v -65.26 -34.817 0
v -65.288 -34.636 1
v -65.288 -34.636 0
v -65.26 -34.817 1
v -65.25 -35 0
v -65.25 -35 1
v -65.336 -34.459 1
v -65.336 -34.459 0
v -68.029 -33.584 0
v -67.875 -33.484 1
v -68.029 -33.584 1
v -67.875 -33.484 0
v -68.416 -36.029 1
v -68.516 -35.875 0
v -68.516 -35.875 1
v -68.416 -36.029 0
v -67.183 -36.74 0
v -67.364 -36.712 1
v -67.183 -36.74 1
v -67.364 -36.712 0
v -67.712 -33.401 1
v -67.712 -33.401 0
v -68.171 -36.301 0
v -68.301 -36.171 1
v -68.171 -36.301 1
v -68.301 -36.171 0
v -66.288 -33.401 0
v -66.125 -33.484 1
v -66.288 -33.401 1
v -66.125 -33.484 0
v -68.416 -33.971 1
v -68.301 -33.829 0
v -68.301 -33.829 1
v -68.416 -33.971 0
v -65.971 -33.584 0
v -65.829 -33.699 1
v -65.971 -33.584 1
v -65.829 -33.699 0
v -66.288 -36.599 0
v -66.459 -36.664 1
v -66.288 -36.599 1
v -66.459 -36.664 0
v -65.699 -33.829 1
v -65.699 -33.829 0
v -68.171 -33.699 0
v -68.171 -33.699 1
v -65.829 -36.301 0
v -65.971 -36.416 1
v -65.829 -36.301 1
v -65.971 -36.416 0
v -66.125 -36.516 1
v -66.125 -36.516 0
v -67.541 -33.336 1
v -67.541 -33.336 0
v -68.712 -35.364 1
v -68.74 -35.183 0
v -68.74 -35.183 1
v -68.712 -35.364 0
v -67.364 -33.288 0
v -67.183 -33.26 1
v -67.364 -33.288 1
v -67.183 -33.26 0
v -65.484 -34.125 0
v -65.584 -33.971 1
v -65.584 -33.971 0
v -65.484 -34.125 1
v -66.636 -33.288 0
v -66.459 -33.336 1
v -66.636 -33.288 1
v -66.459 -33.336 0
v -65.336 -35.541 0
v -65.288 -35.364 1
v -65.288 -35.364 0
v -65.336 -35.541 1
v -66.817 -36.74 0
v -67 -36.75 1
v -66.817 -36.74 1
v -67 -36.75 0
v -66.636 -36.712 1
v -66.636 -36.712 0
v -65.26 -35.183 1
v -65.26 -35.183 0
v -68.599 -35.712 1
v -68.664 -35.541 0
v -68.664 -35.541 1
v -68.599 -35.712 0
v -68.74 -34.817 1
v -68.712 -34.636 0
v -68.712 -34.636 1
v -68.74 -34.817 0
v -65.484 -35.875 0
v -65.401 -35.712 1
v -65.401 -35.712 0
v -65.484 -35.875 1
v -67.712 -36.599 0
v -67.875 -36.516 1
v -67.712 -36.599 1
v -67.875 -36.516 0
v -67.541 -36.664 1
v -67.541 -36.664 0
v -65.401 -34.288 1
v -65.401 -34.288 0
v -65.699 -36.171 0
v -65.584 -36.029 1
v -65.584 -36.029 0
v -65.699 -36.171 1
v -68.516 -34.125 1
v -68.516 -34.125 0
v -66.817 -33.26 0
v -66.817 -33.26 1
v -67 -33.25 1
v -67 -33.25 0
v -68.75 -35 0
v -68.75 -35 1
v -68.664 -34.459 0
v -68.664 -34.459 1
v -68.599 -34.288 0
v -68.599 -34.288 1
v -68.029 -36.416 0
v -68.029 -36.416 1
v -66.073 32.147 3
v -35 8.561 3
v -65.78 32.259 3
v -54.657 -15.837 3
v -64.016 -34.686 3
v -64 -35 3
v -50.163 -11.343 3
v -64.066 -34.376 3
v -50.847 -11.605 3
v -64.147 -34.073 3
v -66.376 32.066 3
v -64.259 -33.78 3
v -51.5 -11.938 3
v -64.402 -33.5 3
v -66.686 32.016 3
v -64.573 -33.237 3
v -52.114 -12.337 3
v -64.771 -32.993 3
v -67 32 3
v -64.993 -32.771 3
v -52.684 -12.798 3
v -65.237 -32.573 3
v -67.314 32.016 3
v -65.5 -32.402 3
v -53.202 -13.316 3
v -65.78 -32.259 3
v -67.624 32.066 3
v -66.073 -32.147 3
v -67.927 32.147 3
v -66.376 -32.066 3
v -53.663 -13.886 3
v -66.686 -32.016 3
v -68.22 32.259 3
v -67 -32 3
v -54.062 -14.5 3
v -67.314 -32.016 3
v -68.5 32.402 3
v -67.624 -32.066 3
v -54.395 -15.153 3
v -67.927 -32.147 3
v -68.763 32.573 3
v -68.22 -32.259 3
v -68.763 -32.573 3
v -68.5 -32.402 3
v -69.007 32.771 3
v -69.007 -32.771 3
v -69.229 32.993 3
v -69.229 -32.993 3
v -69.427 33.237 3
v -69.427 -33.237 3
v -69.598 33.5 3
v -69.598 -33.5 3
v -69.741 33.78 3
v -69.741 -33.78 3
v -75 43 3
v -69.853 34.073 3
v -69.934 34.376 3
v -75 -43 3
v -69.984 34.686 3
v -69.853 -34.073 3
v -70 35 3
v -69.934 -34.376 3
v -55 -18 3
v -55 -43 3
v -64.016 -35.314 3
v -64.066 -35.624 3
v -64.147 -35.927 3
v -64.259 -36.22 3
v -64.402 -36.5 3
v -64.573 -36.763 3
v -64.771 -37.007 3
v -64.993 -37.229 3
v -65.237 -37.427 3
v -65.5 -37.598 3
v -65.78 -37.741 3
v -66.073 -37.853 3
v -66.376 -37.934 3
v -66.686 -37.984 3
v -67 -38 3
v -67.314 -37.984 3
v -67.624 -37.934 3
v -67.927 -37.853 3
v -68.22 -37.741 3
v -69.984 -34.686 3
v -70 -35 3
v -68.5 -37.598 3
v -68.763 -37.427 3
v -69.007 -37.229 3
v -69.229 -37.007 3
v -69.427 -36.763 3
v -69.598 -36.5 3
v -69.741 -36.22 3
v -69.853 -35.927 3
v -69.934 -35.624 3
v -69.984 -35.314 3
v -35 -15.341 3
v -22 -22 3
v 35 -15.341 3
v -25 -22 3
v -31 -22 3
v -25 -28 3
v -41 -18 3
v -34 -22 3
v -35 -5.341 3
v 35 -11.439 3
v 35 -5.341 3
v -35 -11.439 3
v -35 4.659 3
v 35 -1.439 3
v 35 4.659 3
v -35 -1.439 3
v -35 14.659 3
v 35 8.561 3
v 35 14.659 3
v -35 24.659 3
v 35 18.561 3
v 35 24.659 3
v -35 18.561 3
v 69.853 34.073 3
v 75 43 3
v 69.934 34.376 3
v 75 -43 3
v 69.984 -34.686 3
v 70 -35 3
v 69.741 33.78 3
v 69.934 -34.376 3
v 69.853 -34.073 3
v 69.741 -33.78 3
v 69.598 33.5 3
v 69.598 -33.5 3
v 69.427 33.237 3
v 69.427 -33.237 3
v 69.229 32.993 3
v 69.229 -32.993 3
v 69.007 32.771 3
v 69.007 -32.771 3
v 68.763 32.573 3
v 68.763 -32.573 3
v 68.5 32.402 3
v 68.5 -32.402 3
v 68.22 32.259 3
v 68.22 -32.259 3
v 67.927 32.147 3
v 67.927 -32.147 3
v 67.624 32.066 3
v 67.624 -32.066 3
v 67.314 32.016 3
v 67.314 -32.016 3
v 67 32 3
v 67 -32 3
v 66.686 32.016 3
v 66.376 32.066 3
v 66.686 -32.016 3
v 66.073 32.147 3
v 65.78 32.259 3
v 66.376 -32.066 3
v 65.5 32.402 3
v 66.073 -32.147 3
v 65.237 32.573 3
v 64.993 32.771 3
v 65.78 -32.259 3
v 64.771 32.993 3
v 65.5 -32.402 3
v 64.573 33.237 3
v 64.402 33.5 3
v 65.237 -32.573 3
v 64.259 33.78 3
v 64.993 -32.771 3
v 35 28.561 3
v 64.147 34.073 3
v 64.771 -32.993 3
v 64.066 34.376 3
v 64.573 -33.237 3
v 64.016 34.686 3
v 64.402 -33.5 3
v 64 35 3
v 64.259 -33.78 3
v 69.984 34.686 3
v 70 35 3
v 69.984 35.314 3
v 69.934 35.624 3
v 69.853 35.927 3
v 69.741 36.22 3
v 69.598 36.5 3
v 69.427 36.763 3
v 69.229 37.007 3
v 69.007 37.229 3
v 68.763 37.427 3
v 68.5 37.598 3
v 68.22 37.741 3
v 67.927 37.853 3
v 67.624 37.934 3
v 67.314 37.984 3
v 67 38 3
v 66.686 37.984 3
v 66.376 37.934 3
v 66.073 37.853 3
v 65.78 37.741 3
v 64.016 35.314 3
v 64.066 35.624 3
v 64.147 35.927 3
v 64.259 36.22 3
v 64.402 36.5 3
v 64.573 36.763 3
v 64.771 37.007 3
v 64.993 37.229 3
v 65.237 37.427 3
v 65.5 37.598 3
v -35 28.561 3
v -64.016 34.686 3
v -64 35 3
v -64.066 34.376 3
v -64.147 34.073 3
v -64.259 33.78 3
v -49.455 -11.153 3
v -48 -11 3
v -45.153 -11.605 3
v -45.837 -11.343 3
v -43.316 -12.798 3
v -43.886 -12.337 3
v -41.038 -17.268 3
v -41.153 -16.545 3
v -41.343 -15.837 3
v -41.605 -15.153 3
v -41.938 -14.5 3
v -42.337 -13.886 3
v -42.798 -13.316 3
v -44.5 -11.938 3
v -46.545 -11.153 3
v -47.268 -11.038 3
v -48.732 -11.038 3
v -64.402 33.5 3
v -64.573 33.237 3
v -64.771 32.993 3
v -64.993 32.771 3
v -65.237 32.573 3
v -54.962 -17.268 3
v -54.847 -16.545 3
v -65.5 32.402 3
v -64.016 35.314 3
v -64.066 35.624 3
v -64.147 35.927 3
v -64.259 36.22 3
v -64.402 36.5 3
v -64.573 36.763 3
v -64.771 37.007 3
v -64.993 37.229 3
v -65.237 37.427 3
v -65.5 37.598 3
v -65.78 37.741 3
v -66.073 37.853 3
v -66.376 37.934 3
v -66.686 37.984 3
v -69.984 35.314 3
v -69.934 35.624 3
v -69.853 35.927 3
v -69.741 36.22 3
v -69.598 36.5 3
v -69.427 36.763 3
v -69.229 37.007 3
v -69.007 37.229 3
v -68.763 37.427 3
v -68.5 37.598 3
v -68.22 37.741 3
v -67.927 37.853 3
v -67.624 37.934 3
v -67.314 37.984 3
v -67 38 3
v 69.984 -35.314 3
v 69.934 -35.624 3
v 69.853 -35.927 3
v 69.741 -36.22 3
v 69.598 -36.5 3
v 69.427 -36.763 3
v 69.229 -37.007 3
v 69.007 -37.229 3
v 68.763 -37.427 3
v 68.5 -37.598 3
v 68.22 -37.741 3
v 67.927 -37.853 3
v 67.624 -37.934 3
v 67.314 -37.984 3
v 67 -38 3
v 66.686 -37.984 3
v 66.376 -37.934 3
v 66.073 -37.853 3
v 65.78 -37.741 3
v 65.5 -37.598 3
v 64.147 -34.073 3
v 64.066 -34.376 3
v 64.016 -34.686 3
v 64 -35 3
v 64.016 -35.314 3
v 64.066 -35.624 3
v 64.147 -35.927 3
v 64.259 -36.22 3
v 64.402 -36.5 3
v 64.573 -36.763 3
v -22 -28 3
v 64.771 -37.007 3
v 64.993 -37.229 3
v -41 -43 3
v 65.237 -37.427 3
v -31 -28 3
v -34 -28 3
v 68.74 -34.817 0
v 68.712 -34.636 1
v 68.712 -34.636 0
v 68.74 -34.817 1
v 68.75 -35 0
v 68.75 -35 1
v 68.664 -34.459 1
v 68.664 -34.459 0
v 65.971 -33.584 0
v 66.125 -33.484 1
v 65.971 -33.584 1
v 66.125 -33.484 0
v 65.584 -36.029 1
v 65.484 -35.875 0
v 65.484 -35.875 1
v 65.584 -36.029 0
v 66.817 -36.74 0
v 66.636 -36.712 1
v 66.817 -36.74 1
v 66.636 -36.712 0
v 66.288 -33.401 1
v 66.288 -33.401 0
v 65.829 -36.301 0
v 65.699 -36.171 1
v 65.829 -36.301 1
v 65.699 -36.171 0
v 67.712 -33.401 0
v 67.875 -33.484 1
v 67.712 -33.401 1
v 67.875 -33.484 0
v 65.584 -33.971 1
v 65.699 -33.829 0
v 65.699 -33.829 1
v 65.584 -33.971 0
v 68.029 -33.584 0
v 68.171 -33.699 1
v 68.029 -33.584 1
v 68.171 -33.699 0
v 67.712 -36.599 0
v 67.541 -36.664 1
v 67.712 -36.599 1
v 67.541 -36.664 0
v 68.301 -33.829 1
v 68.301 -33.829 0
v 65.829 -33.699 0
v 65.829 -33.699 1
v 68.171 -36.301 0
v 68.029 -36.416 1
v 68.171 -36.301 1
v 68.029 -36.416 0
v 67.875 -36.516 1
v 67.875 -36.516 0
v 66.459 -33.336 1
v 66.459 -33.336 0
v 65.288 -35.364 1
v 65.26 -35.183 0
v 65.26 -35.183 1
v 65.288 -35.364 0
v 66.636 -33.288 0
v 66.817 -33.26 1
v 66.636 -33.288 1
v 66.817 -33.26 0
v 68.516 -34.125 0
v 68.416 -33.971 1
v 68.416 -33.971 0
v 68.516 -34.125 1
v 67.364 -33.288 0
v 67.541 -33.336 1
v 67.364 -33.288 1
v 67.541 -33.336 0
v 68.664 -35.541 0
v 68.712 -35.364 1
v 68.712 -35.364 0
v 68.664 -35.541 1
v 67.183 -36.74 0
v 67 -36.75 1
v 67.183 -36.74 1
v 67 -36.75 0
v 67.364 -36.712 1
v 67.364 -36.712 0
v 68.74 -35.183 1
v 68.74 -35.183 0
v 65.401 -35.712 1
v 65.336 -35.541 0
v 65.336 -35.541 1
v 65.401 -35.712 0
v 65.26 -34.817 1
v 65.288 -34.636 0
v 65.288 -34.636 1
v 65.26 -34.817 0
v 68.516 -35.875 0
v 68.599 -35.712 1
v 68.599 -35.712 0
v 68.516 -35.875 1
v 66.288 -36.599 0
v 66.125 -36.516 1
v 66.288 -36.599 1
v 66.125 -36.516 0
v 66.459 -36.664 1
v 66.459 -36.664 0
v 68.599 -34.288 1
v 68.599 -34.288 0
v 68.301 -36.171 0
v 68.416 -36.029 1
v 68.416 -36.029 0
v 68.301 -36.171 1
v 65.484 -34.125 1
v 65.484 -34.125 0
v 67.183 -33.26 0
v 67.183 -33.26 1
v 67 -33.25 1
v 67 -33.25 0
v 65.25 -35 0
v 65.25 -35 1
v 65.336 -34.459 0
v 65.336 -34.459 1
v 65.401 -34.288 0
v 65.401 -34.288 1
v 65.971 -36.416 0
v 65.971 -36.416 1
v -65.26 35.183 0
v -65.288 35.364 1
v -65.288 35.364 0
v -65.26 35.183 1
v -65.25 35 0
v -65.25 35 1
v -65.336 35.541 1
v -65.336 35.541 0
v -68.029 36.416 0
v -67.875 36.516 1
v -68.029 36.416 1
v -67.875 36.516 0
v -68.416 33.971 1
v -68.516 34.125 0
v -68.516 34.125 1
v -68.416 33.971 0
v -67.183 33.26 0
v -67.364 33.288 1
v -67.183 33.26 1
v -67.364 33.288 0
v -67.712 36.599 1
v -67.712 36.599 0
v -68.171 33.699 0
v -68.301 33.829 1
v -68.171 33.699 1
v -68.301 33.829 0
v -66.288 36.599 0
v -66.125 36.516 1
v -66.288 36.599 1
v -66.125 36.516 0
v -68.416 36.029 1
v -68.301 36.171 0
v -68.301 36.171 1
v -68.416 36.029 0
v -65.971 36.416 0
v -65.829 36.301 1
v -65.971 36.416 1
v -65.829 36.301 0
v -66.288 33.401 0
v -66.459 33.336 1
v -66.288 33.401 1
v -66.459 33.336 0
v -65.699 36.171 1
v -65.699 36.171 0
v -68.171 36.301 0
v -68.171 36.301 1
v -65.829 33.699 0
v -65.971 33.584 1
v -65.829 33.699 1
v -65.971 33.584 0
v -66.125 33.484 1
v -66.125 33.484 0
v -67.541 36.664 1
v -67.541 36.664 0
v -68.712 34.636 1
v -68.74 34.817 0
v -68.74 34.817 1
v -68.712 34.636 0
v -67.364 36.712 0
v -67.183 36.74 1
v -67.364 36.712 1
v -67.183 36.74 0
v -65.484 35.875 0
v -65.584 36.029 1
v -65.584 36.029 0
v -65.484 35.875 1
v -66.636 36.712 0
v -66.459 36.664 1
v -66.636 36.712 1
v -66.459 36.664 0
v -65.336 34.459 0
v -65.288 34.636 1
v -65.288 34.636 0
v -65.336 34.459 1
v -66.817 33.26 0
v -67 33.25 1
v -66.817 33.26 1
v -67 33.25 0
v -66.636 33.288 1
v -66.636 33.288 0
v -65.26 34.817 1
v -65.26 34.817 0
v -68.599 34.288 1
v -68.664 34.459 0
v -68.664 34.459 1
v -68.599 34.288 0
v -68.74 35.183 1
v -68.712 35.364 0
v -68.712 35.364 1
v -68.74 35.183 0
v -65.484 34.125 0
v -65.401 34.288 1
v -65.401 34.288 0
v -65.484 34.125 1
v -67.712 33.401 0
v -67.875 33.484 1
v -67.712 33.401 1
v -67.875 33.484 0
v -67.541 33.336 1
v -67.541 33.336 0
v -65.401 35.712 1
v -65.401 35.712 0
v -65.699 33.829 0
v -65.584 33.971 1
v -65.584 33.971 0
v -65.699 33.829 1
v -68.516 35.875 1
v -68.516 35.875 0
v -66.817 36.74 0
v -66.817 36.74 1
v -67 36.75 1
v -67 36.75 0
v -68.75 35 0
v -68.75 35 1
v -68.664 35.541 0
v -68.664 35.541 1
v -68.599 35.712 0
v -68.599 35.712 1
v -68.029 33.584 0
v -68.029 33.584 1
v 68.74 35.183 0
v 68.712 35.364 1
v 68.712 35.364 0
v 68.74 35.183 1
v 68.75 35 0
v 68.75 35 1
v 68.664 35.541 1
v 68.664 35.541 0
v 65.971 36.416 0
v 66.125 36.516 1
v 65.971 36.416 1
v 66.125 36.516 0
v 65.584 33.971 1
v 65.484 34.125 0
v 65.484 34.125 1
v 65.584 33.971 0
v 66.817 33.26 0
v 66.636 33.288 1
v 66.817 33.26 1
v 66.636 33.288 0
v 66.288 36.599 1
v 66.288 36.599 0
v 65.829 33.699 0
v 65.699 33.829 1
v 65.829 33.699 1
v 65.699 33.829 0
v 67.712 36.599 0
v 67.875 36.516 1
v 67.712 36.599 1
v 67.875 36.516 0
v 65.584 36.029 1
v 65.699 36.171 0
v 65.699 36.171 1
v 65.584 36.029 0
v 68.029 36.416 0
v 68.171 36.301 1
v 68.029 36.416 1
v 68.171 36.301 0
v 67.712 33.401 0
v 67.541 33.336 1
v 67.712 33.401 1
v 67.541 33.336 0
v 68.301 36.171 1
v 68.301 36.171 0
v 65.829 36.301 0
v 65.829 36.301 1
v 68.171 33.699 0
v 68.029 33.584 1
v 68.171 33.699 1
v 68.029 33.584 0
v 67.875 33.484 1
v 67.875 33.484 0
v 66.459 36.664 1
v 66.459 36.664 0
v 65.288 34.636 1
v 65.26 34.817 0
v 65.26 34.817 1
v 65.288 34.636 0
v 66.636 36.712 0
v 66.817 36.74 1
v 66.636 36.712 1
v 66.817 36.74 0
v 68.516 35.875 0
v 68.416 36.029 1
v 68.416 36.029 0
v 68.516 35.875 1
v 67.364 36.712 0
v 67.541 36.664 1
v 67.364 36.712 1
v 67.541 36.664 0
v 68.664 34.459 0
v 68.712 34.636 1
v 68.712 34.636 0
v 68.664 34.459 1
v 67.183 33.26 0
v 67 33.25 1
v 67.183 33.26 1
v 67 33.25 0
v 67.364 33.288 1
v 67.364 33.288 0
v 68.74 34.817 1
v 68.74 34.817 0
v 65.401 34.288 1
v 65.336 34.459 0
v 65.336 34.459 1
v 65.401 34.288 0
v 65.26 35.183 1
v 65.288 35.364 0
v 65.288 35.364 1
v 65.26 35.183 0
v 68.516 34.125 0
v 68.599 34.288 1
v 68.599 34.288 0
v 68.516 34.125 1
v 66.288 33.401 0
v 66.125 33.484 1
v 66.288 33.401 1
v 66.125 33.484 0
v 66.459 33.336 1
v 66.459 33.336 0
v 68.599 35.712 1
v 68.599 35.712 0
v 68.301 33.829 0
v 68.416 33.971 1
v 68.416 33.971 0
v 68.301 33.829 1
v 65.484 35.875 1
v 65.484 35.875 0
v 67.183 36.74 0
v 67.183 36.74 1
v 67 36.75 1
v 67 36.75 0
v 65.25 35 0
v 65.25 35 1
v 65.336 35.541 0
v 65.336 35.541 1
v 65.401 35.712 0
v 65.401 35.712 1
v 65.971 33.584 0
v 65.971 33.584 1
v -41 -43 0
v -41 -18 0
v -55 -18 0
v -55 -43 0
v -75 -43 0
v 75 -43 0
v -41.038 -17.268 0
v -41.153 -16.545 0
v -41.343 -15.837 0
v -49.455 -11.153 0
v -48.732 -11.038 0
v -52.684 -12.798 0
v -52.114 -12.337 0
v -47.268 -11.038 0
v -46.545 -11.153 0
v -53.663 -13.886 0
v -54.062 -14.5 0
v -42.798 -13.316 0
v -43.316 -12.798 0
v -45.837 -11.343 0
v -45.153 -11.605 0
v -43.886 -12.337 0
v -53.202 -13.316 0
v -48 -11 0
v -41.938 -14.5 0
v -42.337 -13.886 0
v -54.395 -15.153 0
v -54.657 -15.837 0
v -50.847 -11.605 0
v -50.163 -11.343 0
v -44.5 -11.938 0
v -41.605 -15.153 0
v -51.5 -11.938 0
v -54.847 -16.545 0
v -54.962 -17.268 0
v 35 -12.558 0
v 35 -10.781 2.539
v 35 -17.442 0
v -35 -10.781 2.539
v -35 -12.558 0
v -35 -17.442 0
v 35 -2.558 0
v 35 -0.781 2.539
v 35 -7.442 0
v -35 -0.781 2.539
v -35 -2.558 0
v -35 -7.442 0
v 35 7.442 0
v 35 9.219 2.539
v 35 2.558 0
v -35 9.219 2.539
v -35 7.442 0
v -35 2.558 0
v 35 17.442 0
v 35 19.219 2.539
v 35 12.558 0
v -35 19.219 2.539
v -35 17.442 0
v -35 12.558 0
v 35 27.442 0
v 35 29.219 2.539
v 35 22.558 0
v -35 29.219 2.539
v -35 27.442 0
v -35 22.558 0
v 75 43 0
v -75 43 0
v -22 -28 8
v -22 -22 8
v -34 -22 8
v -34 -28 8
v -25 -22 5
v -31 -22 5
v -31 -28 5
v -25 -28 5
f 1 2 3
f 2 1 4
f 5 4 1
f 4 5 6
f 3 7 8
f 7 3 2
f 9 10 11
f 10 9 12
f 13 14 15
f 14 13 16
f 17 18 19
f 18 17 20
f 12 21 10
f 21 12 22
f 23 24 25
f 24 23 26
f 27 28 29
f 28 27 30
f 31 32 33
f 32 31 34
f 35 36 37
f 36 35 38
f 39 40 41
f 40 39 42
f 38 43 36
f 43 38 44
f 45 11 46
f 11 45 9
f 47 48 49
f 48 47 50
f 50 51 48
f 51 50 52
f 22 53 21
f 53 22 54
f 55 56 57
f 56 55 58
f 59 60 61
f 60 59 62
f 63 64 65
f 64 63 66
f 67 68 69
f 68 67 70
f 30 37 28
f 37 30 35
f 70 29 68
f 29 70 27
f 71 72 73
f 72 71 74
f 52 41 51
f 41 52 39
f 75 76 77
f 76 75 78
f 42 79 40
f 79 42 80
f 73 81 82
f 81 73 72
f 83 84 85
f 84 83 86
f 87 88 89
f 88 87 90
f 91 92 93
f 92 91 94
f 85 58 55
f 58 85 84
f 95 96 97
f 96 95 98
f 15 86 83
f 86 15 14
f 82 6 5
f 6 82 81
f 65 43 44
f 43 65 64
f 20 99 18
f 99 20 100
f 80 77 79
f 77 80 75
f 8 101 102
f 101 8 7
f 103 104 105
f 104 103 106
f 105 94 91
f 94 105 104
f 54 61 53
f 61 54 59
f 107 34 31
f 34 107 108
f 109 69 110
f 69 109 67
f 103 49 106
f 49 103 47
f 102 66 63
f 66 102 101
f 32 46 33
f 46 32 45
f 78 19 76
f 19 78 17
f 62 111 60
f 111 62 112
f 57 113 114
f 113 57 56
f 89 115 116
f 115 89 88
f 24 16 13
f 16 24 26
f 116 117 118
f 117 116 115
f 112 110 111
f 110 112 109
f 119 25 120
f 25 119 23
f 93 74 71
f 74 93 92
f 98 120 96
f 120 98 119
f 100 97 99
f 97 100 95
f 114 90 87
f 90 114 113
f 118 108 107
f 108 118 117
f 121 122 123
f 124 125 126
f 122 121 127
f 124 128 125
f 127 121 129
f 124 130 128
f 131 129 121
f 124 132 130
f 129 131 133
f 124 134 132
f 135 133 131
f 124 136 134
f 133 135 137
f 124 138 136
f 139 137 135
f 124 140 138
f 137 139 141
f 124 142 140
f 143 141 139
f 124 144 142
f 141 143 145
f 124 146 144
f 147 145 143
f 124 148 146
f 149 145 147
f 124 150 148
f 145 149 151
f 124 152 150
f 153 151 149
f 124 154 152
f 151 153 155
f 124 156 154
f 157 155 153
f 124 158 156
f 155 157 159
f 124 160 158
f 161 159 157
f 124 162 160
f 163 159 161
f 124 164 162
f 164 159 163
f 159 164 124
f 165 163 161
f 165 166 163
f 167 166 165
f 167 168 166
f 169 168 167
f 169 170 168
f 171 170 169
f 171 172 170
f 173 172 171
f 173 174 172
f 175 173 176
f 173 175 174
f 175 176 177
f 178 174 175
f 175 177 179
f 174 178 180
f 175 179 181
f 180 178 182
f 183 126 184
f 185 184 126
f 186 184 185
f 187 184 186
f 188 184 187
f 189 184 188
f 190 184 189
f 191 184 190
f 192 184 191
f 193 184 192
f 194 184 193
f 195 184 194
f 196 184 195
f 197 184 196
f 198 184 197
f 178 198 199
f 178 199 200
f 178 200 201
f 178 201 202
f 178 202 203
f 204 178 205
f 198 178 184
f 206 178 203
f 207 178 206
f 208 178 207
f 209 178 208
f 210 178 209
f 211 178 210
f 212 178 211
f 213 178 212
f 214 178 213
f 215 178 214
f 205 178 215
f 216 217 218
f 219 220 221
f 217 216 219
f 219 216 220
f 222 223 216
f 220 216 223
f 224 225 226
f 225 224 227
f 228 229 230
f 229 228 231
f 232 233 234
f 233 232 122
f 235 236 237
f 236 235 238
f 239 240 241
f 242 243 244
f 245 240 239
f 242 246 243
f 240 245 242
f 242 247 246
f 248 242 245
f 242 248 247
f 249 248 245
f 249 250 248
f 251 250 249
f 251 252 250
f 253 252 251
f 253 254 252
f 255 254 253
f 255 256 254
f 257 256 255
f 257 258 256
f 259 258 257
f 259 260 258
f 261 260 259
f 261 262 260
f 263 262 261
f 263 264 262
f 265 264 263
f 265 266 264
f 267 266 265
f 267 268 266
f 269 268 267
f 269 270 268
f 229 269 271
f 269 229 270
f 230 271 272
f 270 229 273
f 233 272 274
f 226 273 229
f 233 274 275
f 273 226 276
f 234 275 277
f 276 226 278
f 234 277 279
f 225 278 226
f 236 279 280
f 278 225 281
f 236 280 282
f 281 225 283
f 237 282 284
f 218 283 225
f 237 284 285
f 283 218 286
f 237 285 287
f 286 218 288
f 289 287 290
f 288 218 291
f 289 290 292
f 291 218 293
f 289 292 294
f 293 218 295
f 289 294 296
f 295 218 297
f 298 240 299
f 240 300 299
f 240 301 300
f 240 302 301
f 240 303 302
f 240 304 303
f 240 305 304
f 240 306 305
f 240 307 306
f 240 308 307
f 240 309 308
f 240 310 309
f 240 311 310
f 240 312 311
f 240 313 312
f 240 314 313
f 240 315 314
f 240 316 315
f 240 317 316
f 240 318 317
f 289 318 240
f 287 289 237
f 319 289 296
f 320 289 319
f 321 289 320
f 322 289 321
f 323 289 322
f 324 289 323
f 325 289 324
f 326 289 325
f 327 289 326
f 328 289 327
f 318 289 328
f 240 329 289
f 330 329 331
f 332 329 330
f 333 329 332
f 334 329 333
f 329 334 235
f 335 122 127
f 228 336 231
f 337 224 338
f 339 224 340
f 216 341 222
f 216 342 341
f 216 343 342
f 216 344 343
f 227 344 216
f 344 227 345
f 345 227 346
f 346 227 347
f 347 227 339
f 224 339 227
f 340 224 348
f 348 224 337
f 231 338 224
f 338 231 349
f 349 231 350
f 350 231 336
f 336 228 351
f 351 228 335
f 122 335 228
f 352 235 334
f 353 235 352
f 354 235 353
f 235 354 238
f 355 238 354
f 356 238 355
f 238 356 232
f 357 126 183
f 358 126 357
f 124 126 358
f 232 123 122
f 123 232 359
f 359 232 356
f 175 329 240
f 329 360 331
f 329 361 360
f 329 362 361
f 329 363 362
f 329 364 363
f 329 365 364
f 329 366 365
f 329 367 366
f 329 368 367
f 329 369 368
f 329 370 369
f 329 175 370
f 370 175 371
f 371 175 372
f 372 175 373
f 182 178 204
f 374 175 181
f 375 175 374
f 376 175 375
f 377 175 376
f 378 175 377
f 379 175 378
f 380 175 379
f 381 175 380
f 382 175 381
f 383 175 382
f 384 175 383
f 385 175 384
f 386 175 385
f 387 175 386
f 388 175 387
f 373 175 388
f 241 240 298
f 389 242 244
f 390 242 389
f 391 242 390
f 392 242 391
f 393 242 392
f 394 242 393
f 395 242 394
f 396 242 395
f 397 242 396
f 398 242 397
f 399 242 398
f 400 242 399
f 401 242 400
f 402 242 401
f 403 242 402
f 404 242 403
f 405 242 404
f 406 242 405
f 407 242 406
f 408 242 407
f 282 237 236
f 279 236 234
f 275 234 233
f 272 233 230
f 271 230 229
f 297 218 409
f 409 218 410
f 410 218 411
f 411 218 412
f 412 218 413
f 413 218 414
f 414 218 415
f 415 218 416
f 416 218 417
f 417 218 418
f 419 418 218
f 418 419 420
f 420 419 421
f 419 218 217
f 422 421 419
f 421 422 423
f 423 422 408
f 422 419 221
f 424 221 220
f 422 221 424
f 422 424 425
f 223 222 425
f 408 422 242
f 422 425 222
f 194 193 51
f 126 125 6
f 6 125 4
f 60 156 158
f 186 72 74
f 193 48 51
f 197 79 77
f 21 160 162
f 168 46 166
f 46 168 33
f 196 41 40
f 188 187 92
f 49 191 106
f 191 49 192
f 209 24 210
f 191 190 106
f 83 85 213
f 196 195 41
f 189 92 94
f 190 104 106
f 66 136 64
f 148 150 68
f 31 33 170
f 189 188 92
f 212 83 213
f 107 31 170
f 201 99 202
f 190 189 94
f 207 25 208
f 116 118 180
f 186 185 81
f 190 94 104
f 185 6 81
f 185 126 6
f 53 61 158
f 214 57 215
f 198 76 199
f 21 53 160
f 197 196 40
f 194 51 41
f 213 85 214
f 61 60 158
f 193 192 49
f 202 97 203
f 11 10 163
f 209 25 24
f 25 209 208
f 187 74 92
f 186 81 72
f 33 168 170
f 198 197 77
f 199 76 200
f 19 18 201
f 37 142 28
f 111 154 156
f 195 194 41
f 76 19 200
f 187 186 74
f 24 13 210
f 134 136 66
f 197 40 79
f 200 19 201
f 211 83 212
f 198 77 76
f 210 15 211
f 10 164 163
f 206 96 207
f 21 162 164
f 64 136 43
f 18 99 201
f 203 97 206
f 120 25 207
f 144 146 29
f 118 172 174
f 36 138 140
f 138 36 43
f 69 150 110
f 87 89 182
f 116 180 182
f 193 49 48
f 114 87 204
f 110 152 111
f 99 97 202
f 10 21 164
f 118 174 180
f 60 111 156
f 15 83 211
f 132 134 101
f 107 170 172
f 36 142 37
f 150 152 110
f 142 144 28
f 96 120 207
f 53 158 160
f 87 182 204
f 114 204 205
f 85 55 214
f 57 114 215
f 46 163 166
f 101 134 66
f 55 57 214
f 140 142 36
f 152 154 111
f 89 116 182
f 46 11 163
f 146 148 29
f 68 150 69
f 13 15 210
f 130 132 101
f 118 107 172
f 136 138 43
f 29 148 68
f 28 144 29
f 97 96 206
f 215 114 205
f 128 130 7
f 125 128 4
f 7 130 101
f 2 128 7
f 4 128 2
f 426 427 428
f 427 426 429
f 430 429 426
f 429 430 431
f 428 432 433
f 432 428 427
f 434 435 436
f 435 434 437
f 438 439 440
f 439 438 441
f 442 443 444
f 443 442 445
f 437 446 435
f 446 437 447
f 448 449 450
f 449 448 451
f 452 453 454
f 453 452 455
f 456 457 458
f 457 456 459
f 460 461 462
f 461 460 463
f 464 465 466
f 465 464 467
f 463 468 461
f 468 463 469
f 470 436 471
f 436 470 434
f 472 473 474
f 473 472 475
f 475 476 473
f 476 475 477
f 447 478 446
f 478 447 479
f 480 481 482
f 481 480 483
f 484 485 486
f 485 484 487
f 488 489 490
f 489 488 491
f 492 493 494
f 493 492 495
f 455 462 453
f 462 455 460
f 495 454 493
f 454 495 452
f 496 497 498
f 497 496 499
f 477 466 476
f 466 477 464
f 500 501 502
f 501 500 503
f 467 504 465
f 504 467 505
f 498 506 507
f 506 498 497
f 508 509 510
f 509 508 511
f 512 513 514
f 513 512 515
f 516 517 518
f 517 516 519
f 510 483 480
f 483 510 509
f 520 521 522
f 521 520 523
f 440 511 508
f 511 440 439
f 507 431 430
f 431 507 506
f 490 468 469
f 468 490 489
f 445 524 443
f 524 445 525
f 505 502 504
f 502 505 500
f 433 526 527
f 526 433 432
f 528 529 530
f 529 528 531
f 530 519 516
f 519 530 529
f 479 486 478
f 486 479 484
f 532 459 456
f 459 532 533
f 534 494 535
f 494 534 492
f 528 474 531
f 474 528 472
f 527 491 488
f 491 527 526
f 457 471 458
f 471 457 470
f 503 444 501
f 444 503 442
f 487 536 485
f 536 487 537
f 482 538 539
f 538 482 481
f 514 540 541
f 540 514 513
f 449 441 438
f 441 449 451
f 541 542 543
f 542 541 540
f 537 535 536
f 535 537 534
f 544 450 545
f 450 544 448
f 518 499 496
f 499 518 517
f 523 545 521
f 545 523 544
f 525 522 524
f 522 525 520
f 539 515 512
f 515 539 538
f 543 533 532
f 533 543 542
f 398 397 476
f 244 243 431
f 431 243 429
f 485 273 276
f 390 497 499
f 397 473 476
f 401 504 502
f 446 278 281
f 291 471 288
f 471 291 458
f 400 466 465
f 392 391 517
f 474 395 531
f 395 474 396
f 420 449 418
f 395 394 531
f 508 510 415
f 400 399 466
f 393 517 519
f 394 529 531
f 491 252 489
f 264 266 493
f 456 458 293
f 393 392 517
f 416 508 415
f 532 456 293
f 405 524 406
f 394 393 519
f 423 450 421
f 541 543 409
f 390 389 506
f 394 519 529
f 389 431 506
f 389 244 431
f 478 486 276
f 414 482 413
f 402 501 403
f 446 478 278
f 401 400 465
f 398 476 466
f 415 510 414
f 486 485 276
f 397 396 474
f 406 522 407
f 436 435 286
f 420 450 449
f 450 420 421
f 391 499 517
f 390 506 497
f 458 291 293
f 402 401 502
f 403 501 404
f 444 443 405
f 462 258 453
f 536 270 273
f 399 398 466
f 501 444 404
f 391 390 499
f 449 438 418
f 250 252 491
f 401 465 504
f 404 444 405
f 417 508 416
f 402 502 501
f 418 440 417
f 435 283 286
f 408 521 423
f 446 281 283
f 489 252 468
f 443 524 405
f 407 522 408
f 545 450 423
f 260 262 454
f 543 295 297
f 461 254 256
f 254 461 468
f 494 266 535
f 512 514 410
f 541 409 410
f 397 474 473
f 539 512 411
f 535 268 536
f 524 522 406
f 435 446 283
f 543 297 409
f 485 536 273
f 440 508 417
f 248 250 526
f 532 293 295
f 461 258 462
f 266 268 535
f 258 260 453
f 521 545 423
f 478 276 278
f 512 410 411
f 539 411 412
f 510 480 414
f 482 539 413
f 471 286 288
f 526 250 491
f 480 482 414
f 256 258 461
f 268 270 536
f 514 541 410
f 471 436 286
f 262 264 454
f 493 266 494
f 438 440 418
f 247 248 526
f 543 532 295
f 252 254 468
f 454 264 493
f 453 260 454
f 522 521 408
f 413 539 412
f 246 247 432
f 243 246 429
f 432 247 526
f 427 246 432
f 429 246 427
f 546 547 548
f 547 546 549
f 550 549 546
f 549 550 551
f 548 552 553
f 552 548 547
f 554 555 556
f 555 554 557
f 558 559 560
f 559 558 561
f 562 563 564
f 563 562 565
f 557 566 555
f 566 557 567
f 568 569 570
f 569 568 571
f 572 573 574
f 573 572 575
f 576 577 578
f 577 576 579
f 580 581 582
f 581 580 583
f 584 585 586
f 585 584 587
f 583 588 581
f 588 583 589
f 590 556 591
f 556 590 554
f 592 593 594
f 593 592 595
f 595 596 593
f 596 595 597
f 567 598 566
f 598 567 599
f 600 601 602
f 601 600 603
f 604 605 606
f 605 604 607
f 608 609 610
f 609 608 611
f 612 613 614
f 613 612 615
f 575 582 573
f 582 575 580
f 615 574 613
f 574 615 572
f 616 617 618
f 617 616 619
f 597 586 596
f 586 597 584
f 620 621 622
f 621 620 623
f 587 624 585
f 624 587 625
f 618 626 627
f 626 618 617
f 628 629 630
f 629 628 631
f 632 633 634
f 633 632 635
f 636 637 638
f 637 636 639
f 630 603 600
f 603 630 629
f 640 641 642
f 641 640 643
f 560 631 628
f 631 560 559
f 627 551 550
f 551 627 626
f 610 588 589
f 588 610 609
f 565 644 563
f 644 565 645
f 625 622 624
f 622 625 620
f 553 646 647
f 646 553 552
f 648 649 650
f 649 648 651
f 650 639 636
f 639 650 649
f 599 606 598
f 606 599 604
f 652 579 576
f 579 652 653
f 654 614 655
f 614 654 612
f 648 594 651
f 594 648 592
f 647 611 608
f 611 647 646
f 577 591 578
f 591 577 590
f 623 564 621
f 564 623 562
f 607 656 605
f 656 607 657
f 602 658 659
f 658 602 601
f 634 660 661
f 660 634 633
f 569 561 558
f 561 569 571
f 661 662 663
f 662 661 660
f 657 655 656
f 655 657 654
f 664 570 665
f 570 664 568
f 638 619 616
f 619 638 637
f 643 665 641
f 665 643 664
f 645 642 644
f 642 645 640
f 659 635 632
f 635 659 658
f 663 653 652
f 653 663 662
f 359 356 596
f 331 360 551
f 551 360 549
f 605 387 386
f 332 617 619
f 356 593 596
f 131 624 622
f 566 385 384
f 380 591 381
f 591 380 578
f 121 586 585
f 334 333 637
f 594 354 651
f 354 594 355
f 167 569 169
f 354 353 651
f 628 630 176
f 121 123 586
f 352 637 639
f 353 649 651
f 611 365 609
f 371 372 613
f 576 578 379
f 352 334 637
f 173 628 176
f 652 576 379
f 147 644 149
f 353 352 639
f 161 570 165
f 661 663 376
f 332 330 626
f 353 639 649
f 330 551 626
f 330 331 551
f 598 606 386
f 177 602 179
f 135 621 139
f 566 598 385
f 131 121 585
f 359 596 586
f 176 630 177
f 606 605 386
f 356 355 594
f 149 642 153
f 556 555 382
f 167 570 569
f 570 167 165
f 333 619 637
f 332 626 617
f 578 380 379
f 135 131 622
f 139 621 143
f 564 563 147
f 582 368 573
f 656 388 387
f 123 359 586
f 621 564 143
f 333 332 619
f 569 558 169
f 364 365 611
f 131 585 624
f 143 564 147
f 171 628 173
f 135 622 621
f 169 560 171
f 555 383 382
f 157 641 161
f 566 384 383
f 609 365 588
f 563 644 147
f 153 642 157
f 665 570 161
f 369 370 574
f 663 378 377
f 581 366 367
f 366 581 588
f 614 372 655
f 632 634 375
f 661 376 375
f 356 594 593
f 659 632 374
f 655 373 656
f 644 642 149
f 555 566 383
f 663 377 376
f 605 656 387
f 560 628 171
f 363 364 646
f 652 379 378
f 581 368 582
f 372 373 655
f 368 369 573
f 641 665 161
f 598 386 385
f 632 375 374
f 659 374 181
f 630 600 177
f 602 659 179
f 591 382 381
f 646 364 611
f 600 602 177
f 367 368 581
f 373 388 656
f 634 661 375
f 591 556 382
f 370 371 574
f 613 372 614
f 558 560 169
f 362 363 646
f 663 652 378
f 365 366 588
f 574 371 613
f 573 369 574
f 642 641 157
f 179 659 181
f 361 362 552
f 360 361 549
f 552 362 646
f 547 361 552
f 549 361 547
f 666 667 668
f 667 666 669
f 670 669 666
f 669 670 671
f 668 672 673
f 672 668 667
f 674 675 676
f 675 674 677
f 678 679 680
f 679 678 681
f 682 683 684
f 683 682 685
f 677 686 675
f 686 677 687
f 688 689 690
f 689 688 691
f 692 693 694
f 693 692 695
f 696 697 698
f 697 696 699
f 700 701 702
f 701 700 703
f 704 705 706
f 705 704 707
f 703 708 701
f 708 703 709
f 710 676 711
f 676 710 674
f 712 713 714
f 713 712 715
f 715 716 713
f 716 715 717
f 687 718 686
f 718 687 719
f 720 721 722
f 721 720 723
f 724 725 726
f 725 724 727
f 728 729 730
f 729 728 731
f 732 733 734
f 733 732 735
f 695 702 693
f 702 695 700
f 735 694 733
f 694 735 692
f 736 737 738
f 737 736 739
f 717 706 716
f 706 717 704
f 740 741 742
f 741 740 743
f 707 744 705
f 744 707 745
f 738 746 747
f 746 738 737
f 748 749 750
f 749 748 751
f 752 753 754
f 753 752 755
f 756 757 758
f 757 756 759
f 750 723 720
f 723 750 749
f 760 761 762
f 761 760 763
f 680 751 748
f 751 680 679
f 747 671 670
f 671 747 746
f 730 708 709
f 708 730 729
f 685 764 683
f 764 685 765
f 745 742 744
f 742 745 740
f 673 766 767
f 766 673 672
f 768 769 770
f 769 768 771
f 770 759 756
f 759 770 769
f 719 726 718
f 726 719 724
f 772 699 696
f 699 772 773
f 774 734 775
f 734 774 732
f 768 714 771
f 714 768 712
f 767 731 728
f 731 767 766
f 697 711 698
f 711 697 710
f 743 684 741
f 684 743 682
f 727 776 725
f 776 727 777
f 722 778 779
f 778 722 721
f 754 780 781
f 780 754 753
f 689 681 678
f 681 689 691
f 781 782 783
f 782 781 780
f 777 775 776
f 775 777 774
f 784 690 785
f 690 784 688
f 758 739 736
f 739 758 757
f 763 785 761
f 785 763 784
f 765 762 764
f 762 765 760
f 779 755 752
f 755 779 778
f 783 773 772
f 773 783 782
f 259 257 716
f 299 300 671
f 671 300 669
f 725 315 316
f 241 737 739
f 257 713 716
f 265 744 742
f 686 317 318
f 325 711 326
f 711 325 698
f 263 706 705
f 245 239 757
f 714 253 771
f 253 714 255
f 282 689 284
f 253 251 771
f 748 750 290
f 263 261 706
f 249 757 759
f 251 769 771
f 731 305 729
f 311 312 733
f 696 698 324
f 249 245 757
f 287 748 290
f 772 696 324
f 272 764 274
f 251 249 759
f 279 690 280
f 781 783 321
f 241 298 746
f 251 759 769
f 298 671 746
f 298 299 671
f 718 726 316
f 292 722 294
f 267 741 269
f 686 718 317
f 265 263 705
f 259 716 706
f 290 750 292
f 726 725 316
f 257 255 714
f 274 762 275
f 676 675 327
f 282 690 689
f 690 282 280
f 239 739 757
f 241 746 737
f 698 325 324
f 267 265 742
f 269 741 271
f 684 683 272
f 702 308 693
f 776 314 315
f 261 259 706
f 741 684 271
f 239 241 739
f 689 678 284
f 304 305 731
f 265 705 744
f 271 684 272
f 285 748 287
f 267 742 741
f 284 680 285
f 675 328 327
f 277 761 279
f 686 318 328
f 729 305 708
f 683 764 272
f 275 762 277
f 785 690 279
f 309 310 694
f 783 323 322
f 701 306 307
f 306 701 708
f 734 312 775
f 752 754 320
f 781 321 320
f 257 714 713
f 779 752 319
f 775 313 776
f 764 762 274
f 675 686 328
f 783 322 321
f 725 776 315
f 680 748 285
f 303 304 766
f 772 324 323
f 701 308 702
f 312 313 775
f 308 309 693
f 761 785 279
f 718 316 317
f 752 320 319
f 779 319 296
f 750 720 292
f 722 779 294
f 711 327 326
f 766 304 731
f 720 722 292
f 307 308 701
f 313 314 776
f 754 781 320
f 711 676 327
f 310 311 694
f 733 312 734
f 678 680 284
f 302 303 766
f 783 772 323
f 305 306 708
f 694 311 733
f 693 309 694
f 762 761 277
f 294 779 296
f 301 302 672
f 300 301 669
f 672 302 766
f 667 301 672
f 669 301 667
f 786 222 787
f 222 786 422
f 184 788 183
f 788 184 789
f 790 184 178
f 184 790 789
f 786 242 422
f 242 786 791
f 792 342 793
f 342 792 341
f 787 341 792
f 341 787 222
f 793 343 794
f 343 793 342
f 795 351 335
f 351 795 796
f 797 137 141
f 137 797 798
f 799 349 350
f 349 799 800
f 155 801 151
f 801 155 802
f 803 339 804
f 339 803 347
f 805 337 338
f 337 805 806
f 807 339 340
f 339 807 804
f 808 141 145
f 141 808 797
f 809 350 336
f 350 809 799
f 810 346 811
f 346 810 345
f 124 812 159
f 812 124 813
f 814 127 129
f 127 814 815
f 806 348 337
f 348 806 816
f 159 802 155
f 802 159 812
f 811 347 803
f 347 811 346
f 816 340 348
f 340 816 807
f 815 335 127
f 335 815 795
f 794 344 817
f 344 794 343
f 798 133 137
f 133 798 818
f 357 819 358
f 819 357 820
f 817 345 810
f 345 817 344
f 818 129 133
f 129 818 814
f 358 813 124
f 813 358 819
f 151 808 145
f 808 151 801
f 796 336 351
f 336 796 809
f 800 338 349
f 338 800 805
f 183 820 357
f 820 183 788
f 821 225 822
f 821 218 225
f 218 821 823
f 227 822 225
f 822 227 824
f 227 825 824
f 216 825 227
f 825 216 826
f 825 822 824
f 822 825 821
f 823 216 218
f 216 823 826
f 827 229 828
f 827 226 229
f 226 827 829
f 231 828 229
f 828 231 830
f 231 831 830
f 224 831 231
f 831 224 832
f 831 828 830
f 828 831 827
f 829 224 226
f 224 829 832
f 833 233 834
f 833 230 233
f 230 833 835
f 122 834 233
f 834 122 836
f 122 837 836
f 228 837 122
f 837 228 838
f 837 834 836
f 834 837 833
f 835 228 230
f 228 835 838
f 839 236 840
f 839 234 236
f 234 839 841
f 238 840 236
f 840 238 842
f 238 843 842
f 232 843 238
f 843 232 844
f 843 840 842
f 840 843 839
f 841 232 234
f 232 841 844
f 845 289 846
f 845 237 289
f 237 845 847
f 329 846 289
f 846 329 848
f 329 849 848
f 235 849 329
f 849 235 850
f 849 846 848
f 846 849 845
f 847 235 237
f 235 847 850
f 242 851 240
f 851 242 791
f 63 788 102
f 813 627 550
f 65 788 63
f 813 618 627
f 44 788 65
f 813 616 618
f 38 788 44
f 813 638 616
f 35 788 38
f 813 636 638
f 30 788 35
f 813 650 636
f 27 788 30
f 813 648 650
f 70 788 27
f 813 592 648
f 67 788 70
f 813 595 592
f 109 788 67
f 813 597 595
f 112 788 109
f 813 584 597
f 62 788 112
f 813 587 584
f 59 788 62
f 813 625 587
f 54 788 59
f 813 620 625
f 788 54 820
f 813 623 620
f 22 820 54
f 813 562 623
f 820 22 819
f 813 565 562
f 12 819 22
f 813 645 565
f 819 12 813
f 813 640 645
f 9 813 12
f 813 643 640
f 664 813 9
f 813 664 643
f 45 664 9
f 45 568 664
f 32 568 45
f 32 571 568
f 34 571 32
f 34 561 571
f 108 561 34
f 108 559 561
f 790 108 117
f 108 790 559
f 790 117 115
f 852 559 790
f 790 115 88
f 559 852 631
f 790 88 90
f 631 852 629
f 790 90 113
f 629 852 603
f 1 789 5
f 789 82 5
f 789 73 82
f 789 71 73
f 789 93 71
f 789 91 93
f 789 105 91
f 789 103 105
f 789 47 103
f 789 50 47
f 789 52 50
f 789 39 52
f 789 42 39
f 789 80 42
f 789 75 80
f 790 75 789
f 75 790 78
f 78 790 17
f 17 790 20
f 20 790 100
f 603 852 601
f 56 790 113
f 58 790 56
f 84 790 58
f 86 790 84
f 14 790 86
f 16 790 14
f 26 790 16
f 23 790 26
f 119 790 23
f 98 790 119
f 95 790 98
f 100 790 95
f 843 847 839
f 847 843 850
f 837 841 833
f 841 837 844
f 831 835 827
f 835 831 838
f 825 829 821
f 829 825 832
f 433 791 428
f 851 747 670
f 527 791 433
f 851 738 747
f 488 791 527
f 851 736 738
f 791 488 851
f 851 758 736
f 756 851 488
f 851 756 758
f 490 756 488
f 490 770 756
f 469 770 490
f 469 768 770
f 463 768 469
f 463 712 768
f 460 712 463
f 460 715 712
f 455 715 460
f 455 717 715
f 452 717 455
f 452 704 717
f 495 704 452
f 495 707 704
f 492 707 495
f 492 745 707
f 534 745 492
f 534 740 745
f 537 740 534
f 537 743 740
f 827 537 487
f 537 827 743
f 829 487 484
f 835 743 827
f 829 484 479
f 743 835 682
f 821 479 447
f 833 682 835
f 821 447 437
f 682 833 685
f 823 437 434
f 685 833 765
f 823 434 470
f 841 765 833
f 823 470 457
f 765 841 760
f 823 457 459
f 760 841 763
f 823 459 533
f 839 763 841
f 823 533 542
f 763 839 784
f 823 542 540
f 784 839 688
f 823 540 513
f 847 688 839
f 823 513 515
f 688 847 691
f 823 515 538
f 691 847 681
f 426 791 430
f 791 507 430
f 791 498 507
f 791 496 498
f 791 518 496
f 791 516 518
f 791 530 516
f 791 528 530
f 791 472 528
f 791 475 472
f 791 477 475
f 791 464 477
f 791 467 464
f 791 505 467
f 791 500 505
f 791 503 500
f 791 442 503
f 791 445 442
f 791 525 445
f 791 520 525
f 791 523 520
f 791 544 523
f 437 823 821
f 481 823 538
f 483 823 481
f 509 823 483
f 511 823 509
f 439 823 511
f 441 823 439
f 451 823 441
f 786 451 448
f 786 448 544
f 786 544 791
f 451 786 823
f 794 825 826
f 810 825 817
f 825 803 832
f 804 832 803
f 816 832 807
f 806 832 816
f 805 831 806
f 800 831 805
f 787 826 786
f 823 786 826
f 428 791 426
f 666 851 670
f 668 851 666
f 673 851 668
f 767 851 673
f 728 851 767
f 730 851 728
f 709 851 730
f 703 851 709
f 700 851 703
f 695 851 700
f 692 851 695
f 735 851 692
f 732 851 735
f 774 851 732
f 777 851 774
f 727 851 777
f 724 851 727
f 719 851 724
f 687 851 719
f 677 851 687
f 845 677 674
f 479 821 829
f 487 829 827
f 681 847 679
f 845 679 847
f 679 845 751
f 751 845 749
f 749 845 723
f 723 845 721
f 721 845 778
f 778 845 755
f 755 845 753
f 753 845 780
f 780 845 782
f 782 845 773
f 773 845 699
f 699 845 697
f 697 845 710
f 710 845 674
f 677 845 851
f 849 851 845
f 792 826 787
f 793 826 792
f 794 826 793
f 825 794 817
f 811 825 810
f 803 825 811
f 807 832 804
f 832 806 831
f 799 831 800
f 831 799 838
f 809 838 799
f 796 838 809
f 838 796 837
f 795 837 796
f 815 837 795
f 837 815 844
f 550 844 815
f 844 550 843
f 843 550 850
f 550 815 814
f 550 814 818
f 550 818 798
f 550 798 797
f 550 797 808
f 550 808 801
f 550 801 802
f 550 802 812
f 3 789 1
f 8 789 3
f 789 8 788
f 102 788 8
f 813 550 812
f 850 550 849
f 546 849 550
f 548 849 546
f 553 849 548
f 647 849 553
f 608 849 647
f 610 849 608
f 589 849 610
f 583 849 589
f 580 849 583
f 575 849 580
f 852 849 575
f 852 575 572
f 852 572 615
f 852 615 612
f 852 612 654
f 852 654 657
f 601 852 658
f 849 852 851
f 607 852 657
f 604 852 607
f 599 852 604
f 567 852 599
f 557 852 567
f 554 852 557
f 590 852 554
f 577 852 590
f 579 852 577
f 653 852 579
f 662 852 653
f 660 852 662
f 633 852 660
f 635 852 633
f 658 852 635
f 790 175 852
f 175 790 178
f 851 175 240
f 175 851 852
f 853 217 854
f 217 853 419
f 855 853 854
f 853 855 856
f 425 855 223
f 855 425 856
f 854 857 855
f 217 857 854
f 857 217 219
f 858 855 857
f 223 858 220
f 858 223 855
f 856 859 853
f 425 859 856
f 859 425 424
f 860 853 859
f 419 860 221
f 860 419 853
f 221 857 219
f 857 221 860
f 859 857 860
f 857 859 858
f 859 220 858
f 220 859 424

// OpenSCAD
// ====================================================================
// PARAMETRIC ATX CUTOUT COVER PLATE FOR THING-O-MATIC / SMOOTHIEBOARD
// ====================================================================

$fn = 60; // Smoothness for circles

// --- Dimensions (Standard ATX Specifications) ---
plate_w   = 150.0; // Standard ATX width
plate_h   = 86.0;  // Standard ATX height
plate_t   = 3.0;   // Plate thickness (3mm for rigid PETG/ABS)

// --- ATX Mounting Hole Offsets (Asymmetric standard) ---
hole_dist_x = 134.0; // Distance between left and right holes
hole_dist_y = 70.0;  // Distance between top and bottom holes
hole_r      = 1.75;  // 3.5mm diameter for M3 clearance screws

// --- Custom Feature Settings ---
power_cable_d = 14.0; // Main AC power cable slot width

// --- Countersink (M3 flat-head) ---
countersink_r = 3.0;  // M3 flat-head radius (6mm head diameter)
countersink_d = 2.0;  // Depth — leaves 1mm of plate below head

// ====================================================================
// MAIN GEOMETRY GENERATION
// ====================================================================

// Clearance shaft + flat-head countersink from the top face
module mounting_hole() {
    cylinder(r=hole_r, h=plate_t+2); // full shaft
    translate([0, 0, plate_t - countersink_d + 1])
        cylinder(r1=hole_r, r2=countersink_r, h=countersink_d); // cone into top
}

difference() {
    // 1. Base Plate
    translate([-plate_w/2, -plate_h/2, 0])
        cube([plate_w, plate_h, plate_t]);

    // 2. ATX Screw Holes with M3 flat-head countersink
    translate([-hole_dist_x/2, -hole_dist_y/2, -1]) mounting_hole();
    translate([ hole_dist_x/2, -hole_dist_y/2, -1]) mounting_hole();
    translate([-hole_dist_x/2,  hole_dist_y/2, -1]) mounting_hole();
    translate([ hole_dist_x/2,  hole_dist_y/2, -1]) mounting_hole();

    // 3. Left Side: AC Power Cord Slot
    translate([-plate_w/2 + 20, -plate_h/2, -1]) {
        cube([power_cable_d, 25, plate_t+2]);
        translate([power_cable_d/2, 25, 0]) 
            cylinder(r=power_cable_d/2, h=plate_t+2);
    }


    // 4. Center Array: Downward-Angled Cooling Louvers (Vent Fins)
    // Centred at x=0 (spanning x=-35 to +35):
    //   - Clears the power slot right edge at x=-41 (6mm gap)
    //   - Clears the screw holes at x=±67 (32mm gap)
    //   - Clamped to y=25 to avoid screw holes at y=±35
    for (y = [-15 : 10 : 25]) {
        translate([0, y, 0])
            rotate([-35, 0, 0]) // Angles the blade down to block debris
            cube([70, 4, plate_t * 3], center=true);
    }
}

// ====================================================================
// ADDITIVE FEATURES (Strain Relief Anchors)
// ====================================================================

// Internal Zip-Tie Anchor Loop for the AC Main Power Cord
// Positioned right next to the power cable entry slot
translate([-plate_w/2 + 20 + (power_cable_d * 1.5), -plate_h/2 + 15, 0]) {
    difference() {
        // Outer anchor block
        cube([12, 6, 8]);
        // Slot for standard zip-tie to slide through
        translate([3, -1, 2]) cube([6, 8, 3]);
    }
}
